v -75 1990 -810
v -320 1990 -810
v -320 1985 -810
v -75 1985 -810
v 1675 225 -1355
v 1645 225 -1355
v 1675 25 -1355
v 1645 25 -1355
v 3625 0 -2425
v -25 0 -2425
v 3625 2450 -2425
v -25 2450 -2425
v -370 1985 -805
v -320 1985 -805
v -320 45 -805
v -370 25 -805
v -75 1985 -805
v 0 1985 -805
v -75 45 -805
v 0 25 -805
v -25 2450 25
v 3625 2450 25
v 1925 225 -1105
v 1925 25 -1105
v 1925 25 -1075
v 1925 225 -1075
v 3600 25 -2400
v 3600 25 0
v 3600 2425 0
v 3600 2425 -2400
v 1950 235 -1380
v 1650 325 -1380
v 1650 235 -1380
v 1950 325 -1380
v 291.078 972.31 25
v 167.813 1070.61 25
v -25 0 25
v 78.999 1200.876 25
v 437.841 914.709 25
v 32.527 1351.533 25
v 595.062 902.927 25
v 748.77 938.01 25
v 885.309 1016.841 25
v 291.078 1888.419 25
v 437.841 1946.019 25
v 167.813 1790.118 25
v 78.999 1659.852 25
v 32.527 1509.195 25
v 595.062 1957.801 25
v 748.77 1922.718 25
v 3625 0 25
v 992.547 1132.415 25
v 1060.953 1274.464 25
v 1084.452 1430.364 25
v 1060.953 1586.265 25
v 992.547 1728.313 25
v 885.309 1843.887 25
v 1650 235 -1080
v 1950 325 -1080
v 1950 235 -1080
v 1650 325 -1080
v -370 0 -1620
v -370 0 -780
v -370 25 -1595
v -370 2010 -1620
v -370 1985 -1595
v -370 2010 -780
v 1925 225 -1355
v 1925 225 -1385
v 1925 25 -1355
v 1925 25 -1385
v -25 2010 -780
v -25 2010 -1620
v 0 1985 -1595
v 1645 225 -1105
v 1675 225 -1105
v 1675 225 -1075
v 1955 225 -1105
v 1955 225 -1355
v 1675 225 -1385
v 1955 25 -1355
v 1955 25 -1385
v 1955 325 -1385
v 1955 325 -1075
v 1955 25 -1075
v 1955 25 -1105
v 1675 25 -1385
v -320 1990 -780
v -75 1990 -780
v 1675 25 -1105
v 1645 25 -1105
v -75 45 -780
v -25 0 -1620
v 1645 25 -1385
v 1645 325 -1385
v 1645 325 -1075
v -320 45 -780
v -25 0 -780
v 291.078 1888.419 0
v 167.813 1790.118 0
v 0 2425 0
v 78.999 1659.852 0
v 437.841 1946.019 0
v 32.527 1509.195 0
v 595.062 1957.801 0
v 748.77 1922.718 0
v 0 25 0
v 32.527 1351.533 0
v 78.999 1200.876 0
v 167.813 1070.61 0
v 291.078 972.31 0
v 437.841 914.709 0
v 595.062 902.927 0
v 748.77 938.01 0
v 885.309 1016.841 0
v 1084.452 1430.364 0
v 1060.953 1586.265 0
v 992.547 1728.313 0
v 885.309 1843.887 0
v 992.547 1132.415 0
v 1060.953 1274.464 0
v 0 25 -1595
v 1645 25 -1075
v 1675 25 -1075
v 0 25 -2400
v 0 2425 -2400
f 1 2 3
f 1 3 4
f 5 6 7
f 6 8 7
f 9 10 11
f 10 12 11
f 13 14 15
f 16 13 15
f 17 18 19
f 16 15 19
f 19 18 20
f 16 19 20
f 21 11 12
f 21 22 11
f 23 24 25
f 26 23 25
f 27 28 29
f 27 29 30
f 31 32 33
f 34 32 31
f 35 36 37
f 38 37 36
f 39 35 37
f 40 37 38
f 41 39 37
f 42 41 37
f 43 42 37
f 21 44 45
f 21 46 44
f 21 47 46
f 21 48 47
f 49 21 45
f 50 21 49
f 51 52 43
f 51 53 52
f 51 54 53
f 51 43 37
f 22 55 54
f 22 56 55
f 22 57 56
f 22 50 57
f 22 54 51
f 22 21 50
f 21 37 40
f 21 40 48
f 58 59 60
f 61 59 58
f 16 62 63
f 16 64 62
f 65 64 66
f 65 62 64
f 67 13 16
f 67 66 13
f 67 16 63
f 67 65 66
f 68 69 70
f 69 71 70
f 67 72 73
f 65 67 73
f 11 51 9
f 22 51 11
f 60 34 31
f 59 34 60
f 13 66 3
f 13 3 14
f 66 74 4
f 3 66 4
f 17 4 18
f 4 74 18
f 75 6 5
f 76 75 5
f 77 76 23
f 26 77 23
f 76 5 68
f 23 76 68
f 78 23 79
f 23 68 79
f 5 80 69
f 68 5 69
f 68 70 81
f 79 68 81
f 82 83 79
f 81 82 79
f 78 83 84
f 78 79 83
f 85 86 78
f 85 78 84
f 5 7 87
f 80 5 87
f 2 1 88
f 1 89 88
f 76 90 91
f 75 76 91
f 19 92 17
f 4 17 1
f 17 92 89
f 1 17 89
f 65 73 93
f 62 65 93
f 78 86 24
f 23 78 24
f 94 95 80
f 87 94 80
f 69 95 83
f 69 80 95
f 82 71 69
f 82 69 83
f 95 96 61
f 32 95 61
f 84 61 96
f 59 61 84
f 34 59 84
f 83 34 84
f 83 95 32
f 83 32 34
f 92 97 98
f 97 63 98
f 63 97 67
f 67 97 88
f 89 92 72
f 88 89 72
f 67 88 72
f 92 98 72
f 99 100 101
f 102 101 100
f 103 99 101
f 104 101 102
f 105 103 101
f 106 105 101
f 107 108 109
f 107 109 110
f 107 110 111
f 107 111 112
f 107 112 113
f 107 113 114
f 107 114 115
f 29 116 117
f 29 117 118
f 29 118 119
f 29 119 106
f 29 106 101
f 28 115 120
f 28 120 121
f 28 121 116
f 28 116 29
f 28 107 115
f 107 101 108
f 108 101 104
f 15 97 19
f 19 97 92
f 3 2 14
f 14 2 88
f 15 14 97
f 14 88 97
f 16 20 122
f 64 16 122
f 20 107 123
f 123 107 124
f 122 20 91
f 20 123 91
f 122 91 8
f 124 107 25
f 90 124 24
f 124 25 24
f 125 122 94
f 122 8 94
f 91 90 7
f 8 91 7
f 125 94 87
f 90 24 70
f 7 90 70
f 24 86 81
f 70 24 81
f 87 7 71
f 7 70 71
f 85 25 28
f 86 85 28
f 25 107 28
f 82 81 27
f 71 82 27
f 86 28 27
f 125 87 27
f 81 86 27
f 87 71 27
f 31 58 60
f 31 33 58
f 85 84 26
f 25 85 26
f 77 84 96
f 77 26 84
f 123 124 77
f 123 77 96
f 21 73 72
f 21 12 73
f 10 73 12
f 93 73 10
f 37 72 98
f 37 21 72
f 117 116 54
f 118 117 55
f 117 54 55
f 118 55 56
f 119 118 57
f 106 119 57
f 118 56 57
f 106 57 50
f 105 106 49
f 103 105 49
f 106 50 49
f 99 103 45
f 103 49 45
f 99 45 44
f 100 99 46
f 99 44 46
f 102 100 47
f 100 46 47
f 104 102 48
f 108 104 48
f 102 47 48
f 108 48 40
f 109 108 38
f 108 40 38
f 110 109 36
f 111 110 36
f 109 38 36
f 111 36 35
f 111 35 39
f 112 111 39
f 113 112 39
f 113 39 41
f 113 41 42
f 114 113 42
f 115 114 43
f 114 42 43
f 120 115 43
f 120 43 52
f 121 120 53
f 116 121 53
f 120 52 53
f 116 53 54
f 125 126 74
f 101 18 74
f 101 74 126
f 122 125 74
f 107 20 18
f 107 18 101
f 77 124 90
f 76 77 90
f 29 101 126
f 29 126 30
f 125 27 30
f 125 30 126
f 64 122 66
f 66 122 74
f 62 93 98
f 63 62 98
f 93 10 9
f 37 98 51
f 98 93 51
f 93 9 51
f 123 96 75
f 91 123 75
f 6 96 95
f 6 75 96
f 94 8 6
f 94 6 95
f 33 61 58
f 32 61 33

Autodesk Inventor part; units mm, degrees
ref_plane "YZ Plane" through (0, 0, 0) normal (1, 0, 0) x (0, 1, 0)
ref_plane "XZ Plane" through (0, 0, 0) normal (0, 1, 0) x (-1, 0, 0)
ref_plane "XY Plane" through (0, 0, 0) normal (0, 0, 1) x (1, 0, 0)
sketch "Sketch1" plane through (0, 0, 0) normal (0, 1, 0) x (-1, 0, 0)
  line L0 (25, 25) -> (-3625, 25)
  line L1 (-3625, 25) -> (-3625, -2425)
  line L2 (-3625, -2425) -> (25, -2425)
  line L3 (25, -2425) -> (25, 25)
  point P0 (0, 0)
  dimension "d0" = 25
  dimension "d1" = 25
  dimension "d2" = 2450
  dimension "d3" = 3650
extrude "Extrusion1" add sketch "Sketch1" along normal blind 25
sketch "Sketch2" plane through (0, 25, 0) normal (0, 1, 0) x (1, 0, 0)
  line L0 (3625, 2425) -> (-25, 2425) projected
  line L1 (-25, 2425) -> (-25, -25) projected
  line L2 (1645, 1355) -> (1675, 1355)
  line L3 (1675, 1355) -> (1675, 1385)
  line L4 (1675, 1385) -> (1645, 1385)
  line L5 (1645, 1385) -> (1645, 1355)
  line L6 (1925, 1355) -> (1955, 1355)
  line L7 (1955, 1355) -> (1955, 1385)
  line L8 (1955, 1385) -> (1925, 1385)
  line L9 (1925, 1385) -> (1925, 1355)
  line L10 (1925, 1075) -> (1955, 1075)
  line L11 (1955, 1075) -> (1955, 1105)
  line L12 (1955, 1105) -> (1925, 1105)
  line L13 (1925, 1105) -> (1925, 1075)
  line L14 (1645, 1075) -> (1675, 1075)
  line L15 (1675, 1075) -> (1675, 1105)
  line L16 (1675, 1105) -> (1645, 1105)
  line L17 (1645, 1105) -> (1645, 1075)
  point P0 (0, 0)
  dimension "d6" = 1670
  dimension "d7" = 1070
  dimension "d8" = 30
  dimension "d9" = 30
  dimension "d10" = 30
  dimension "d11" = 30
  dimension "d12" = 30
  dimension "d13" = 30
  dimension "d14" = 30
  dimension "d15" = 30
  dimension "d16" = 250
  dimension "d17" = 250
  dimension "d18" = 250
  dimension "d19" = 0
  dimension "d20" = 250
  dimension "d21" = 30
extrude "Extrusion2" add sketch "Sketch2" along normal blind 200
sketch "Sketch3" plane through (0, 225, 0) normal (0, 1, 0) x (1, 0, 0)
  line L0 (1645, 1385) -> (1955, 1385)
  line L1 (1955, 1385) -> (1955, 1075)
  line L2 (1955, 1075) -> (1645, 1075)
  line L3 (1645, 1075) -> (1645, 1385)
  point P0 (0, 0)
  dimension "d24" = 310
  dimension "d26" = 310
extrude "Extrusion3" add sketch "Sketch3" along normal blind 100
sketch "Sketch4" plane through (0, 325, 0) normal (0, 1, 0) x (1, 0, 0)
  line L0 (1645, 1385) -> (1645, 1075) projected
  line L1 (1645, 1075) -> (1955, 1075) projected
  line L2 (1955, 1075) -> (1955, 1385) projected
  line L3 (1955, 1385) -> (1645, 1385) projected
  line L4 (1650, 1380) -> (1950, 1380)
  line L5 (1950, 1380) -> (1950, 1080)
  line L6 (1950, 1080) -> (1650, 1080)
  line L7 (1650, 1080) -> (1650, 1380)
  point P0 (0, 0)
  dimension "d29" = 5
  dimension "d30" = 5
  dimension "d31" = 5
  dimension "d32" = 5
extrude "Extrusion4" cut sketch "Sketch4" against normal blind 90 contours L4 L5 L6 L7
sketch "Sketch5" plane through (0, 25, 0) normal (0, 1, 0) x (1, 0, 0)
  line L0 (-25, -25) -> (3625, -25) projected
  line L1 (3625, -25) -> (3625, 2425) projected
  line L2 (-25, -25) -> (3625, -25)
  line L3 (3625, -25) -> (3625, 2425)
  line L4 (3625, 2425) -> (-25, 2425)
  line L5 (-25, 2425) -> (-25, -25)
  line L6 (0, 0) -> (3600, 0)
  line L7 (3600, 0) -> (3600, 2400)
  line L8 (3600, 2400) -> (0, 2400)
  line L9 (0, 2400) -> (0, 0)
  dimension "d35" = 25
  dimension "d37" = 25
extrude "Extrusion5" add sketch "Sketch5" along normal blind 2400
sketch "Sketch6" plane through (-25, 0, -2425) normal (-1, 0, 0) x (0, 0, 1)
  line L0 (0, 0) -> (2450, 0) projected
  line L1 (0, 0) -> (0, 2425) projected
  line L2 (830, 25) -> (1620, 25)
  line L3 (1620, 25) -> (1620, 1985)
  line L4 (1620, 1985) -> (830, 1985)
  line L5 (830, 1985) -> (830, 25)
  line L6 (805, 0) -> (1645, 0)
  line L7 (1645, 0) -> (1645, 2010)
  line L8 (1645, 2010) -> (805, 2010)
  line L9 (805, 2010) -> (805, 0)
  point P0 (2425, 0)
  dimension "d40" = 25
  dimension "d41" = 790
  dimension "d42" = 1960
  dimension "d43" = 830
  dimension "d44" = 25
  dimension "d45" = 25
  dimension "d46" = 25
extrude "Extrusion6" cut sketch "Sketch6" against normal blind 30 contours L5 L4 L3 L2
sketch "Sketch7" plane through (-25, 0, -2425) normal (-1, 0, 0) x (0, 0, 1)
  line L0 (1620, 1985) -> (1620, 25) projected
  line L1 (1620, 25) -> (830, 25) projected
  line L2 (830, 25) -> (830, 1985) projected
  line L3 (830, 1985) -> (1620, 1985) projected
  line L4 (0, 0) -> (2450, 0) projected
  line L5 (805, 0) -> (1645, 0)
  line L6 (1645, 0) -> (1645, 2010)
  line L7 (1645, 2010) -> (805, 2010)
  line L8 (805, 2010) -> (805, 0)
  point P0 (2425, 0)
  dimension "d49" = 25
  dimension "d50" = 25
  dimension "d51" = 25
extrude "Extrusion7" add sketch "Sketch7" along normal blind 345
sketch "Sketch8" plane through (-25, 0, 25) normal (0, 0, 1) x (1, 0, 0)
  circle A0 centre (580.5357, 1430.3643) radius 528.9159
  point P0 (25, 0)
extrude "Extrusion8" cut sketch "Sketch8" against normal blind 30
sketch "Sketch9" plane through (-25, 0, -780) normal (0, 0, 1) x (1, 0, 0)
  line L0 (0, 2010) -> (0, 0) projected
  line L1 (0, 2010) -> (-345, 2010) projected
  line L2 (-345, 0) -> (-345, 2010) projected
  line L3 (-295, 45) -> (-50, 45)
  line L4 (-50, 45) -> (-50, 1990)
  line L5 (-50, 1990) -> (-295, 1990)
  line L6 (-295, 1990) -> (-295, 45)
  line L7 (25, 25) -> (-345, 25) projected
  point P0 (25, 0)
  dimension "d56" = 50
  dimension "d57" = 20
  dimension "d58" = 20
  dimension "d59" = 50
extrude "Extrusion9" cut sketch "Sketch9" against normal blind 30 contours L6 L5 L4 L3
sketch "Sketch10" plane through (-25, 0, 25) normal (0, 0, 1) x (1, 0, 0)
  line L0 (0, 2425) -> (3650, 2425)
  line L1 (3650, 2425) -> (3650, 2450)
  line L2 (3650, 2450) -> (0, 2450)
  line L3 (0, 2450) -> (0, 2425)
  point P0 (25, 0)
  dimension "d62" = 25
  dimension "d64" = 3650
extrude "Extrusion10" add sketch "Sketch10" against normal blind 2450
properties part number "Bryant_Compartment"
